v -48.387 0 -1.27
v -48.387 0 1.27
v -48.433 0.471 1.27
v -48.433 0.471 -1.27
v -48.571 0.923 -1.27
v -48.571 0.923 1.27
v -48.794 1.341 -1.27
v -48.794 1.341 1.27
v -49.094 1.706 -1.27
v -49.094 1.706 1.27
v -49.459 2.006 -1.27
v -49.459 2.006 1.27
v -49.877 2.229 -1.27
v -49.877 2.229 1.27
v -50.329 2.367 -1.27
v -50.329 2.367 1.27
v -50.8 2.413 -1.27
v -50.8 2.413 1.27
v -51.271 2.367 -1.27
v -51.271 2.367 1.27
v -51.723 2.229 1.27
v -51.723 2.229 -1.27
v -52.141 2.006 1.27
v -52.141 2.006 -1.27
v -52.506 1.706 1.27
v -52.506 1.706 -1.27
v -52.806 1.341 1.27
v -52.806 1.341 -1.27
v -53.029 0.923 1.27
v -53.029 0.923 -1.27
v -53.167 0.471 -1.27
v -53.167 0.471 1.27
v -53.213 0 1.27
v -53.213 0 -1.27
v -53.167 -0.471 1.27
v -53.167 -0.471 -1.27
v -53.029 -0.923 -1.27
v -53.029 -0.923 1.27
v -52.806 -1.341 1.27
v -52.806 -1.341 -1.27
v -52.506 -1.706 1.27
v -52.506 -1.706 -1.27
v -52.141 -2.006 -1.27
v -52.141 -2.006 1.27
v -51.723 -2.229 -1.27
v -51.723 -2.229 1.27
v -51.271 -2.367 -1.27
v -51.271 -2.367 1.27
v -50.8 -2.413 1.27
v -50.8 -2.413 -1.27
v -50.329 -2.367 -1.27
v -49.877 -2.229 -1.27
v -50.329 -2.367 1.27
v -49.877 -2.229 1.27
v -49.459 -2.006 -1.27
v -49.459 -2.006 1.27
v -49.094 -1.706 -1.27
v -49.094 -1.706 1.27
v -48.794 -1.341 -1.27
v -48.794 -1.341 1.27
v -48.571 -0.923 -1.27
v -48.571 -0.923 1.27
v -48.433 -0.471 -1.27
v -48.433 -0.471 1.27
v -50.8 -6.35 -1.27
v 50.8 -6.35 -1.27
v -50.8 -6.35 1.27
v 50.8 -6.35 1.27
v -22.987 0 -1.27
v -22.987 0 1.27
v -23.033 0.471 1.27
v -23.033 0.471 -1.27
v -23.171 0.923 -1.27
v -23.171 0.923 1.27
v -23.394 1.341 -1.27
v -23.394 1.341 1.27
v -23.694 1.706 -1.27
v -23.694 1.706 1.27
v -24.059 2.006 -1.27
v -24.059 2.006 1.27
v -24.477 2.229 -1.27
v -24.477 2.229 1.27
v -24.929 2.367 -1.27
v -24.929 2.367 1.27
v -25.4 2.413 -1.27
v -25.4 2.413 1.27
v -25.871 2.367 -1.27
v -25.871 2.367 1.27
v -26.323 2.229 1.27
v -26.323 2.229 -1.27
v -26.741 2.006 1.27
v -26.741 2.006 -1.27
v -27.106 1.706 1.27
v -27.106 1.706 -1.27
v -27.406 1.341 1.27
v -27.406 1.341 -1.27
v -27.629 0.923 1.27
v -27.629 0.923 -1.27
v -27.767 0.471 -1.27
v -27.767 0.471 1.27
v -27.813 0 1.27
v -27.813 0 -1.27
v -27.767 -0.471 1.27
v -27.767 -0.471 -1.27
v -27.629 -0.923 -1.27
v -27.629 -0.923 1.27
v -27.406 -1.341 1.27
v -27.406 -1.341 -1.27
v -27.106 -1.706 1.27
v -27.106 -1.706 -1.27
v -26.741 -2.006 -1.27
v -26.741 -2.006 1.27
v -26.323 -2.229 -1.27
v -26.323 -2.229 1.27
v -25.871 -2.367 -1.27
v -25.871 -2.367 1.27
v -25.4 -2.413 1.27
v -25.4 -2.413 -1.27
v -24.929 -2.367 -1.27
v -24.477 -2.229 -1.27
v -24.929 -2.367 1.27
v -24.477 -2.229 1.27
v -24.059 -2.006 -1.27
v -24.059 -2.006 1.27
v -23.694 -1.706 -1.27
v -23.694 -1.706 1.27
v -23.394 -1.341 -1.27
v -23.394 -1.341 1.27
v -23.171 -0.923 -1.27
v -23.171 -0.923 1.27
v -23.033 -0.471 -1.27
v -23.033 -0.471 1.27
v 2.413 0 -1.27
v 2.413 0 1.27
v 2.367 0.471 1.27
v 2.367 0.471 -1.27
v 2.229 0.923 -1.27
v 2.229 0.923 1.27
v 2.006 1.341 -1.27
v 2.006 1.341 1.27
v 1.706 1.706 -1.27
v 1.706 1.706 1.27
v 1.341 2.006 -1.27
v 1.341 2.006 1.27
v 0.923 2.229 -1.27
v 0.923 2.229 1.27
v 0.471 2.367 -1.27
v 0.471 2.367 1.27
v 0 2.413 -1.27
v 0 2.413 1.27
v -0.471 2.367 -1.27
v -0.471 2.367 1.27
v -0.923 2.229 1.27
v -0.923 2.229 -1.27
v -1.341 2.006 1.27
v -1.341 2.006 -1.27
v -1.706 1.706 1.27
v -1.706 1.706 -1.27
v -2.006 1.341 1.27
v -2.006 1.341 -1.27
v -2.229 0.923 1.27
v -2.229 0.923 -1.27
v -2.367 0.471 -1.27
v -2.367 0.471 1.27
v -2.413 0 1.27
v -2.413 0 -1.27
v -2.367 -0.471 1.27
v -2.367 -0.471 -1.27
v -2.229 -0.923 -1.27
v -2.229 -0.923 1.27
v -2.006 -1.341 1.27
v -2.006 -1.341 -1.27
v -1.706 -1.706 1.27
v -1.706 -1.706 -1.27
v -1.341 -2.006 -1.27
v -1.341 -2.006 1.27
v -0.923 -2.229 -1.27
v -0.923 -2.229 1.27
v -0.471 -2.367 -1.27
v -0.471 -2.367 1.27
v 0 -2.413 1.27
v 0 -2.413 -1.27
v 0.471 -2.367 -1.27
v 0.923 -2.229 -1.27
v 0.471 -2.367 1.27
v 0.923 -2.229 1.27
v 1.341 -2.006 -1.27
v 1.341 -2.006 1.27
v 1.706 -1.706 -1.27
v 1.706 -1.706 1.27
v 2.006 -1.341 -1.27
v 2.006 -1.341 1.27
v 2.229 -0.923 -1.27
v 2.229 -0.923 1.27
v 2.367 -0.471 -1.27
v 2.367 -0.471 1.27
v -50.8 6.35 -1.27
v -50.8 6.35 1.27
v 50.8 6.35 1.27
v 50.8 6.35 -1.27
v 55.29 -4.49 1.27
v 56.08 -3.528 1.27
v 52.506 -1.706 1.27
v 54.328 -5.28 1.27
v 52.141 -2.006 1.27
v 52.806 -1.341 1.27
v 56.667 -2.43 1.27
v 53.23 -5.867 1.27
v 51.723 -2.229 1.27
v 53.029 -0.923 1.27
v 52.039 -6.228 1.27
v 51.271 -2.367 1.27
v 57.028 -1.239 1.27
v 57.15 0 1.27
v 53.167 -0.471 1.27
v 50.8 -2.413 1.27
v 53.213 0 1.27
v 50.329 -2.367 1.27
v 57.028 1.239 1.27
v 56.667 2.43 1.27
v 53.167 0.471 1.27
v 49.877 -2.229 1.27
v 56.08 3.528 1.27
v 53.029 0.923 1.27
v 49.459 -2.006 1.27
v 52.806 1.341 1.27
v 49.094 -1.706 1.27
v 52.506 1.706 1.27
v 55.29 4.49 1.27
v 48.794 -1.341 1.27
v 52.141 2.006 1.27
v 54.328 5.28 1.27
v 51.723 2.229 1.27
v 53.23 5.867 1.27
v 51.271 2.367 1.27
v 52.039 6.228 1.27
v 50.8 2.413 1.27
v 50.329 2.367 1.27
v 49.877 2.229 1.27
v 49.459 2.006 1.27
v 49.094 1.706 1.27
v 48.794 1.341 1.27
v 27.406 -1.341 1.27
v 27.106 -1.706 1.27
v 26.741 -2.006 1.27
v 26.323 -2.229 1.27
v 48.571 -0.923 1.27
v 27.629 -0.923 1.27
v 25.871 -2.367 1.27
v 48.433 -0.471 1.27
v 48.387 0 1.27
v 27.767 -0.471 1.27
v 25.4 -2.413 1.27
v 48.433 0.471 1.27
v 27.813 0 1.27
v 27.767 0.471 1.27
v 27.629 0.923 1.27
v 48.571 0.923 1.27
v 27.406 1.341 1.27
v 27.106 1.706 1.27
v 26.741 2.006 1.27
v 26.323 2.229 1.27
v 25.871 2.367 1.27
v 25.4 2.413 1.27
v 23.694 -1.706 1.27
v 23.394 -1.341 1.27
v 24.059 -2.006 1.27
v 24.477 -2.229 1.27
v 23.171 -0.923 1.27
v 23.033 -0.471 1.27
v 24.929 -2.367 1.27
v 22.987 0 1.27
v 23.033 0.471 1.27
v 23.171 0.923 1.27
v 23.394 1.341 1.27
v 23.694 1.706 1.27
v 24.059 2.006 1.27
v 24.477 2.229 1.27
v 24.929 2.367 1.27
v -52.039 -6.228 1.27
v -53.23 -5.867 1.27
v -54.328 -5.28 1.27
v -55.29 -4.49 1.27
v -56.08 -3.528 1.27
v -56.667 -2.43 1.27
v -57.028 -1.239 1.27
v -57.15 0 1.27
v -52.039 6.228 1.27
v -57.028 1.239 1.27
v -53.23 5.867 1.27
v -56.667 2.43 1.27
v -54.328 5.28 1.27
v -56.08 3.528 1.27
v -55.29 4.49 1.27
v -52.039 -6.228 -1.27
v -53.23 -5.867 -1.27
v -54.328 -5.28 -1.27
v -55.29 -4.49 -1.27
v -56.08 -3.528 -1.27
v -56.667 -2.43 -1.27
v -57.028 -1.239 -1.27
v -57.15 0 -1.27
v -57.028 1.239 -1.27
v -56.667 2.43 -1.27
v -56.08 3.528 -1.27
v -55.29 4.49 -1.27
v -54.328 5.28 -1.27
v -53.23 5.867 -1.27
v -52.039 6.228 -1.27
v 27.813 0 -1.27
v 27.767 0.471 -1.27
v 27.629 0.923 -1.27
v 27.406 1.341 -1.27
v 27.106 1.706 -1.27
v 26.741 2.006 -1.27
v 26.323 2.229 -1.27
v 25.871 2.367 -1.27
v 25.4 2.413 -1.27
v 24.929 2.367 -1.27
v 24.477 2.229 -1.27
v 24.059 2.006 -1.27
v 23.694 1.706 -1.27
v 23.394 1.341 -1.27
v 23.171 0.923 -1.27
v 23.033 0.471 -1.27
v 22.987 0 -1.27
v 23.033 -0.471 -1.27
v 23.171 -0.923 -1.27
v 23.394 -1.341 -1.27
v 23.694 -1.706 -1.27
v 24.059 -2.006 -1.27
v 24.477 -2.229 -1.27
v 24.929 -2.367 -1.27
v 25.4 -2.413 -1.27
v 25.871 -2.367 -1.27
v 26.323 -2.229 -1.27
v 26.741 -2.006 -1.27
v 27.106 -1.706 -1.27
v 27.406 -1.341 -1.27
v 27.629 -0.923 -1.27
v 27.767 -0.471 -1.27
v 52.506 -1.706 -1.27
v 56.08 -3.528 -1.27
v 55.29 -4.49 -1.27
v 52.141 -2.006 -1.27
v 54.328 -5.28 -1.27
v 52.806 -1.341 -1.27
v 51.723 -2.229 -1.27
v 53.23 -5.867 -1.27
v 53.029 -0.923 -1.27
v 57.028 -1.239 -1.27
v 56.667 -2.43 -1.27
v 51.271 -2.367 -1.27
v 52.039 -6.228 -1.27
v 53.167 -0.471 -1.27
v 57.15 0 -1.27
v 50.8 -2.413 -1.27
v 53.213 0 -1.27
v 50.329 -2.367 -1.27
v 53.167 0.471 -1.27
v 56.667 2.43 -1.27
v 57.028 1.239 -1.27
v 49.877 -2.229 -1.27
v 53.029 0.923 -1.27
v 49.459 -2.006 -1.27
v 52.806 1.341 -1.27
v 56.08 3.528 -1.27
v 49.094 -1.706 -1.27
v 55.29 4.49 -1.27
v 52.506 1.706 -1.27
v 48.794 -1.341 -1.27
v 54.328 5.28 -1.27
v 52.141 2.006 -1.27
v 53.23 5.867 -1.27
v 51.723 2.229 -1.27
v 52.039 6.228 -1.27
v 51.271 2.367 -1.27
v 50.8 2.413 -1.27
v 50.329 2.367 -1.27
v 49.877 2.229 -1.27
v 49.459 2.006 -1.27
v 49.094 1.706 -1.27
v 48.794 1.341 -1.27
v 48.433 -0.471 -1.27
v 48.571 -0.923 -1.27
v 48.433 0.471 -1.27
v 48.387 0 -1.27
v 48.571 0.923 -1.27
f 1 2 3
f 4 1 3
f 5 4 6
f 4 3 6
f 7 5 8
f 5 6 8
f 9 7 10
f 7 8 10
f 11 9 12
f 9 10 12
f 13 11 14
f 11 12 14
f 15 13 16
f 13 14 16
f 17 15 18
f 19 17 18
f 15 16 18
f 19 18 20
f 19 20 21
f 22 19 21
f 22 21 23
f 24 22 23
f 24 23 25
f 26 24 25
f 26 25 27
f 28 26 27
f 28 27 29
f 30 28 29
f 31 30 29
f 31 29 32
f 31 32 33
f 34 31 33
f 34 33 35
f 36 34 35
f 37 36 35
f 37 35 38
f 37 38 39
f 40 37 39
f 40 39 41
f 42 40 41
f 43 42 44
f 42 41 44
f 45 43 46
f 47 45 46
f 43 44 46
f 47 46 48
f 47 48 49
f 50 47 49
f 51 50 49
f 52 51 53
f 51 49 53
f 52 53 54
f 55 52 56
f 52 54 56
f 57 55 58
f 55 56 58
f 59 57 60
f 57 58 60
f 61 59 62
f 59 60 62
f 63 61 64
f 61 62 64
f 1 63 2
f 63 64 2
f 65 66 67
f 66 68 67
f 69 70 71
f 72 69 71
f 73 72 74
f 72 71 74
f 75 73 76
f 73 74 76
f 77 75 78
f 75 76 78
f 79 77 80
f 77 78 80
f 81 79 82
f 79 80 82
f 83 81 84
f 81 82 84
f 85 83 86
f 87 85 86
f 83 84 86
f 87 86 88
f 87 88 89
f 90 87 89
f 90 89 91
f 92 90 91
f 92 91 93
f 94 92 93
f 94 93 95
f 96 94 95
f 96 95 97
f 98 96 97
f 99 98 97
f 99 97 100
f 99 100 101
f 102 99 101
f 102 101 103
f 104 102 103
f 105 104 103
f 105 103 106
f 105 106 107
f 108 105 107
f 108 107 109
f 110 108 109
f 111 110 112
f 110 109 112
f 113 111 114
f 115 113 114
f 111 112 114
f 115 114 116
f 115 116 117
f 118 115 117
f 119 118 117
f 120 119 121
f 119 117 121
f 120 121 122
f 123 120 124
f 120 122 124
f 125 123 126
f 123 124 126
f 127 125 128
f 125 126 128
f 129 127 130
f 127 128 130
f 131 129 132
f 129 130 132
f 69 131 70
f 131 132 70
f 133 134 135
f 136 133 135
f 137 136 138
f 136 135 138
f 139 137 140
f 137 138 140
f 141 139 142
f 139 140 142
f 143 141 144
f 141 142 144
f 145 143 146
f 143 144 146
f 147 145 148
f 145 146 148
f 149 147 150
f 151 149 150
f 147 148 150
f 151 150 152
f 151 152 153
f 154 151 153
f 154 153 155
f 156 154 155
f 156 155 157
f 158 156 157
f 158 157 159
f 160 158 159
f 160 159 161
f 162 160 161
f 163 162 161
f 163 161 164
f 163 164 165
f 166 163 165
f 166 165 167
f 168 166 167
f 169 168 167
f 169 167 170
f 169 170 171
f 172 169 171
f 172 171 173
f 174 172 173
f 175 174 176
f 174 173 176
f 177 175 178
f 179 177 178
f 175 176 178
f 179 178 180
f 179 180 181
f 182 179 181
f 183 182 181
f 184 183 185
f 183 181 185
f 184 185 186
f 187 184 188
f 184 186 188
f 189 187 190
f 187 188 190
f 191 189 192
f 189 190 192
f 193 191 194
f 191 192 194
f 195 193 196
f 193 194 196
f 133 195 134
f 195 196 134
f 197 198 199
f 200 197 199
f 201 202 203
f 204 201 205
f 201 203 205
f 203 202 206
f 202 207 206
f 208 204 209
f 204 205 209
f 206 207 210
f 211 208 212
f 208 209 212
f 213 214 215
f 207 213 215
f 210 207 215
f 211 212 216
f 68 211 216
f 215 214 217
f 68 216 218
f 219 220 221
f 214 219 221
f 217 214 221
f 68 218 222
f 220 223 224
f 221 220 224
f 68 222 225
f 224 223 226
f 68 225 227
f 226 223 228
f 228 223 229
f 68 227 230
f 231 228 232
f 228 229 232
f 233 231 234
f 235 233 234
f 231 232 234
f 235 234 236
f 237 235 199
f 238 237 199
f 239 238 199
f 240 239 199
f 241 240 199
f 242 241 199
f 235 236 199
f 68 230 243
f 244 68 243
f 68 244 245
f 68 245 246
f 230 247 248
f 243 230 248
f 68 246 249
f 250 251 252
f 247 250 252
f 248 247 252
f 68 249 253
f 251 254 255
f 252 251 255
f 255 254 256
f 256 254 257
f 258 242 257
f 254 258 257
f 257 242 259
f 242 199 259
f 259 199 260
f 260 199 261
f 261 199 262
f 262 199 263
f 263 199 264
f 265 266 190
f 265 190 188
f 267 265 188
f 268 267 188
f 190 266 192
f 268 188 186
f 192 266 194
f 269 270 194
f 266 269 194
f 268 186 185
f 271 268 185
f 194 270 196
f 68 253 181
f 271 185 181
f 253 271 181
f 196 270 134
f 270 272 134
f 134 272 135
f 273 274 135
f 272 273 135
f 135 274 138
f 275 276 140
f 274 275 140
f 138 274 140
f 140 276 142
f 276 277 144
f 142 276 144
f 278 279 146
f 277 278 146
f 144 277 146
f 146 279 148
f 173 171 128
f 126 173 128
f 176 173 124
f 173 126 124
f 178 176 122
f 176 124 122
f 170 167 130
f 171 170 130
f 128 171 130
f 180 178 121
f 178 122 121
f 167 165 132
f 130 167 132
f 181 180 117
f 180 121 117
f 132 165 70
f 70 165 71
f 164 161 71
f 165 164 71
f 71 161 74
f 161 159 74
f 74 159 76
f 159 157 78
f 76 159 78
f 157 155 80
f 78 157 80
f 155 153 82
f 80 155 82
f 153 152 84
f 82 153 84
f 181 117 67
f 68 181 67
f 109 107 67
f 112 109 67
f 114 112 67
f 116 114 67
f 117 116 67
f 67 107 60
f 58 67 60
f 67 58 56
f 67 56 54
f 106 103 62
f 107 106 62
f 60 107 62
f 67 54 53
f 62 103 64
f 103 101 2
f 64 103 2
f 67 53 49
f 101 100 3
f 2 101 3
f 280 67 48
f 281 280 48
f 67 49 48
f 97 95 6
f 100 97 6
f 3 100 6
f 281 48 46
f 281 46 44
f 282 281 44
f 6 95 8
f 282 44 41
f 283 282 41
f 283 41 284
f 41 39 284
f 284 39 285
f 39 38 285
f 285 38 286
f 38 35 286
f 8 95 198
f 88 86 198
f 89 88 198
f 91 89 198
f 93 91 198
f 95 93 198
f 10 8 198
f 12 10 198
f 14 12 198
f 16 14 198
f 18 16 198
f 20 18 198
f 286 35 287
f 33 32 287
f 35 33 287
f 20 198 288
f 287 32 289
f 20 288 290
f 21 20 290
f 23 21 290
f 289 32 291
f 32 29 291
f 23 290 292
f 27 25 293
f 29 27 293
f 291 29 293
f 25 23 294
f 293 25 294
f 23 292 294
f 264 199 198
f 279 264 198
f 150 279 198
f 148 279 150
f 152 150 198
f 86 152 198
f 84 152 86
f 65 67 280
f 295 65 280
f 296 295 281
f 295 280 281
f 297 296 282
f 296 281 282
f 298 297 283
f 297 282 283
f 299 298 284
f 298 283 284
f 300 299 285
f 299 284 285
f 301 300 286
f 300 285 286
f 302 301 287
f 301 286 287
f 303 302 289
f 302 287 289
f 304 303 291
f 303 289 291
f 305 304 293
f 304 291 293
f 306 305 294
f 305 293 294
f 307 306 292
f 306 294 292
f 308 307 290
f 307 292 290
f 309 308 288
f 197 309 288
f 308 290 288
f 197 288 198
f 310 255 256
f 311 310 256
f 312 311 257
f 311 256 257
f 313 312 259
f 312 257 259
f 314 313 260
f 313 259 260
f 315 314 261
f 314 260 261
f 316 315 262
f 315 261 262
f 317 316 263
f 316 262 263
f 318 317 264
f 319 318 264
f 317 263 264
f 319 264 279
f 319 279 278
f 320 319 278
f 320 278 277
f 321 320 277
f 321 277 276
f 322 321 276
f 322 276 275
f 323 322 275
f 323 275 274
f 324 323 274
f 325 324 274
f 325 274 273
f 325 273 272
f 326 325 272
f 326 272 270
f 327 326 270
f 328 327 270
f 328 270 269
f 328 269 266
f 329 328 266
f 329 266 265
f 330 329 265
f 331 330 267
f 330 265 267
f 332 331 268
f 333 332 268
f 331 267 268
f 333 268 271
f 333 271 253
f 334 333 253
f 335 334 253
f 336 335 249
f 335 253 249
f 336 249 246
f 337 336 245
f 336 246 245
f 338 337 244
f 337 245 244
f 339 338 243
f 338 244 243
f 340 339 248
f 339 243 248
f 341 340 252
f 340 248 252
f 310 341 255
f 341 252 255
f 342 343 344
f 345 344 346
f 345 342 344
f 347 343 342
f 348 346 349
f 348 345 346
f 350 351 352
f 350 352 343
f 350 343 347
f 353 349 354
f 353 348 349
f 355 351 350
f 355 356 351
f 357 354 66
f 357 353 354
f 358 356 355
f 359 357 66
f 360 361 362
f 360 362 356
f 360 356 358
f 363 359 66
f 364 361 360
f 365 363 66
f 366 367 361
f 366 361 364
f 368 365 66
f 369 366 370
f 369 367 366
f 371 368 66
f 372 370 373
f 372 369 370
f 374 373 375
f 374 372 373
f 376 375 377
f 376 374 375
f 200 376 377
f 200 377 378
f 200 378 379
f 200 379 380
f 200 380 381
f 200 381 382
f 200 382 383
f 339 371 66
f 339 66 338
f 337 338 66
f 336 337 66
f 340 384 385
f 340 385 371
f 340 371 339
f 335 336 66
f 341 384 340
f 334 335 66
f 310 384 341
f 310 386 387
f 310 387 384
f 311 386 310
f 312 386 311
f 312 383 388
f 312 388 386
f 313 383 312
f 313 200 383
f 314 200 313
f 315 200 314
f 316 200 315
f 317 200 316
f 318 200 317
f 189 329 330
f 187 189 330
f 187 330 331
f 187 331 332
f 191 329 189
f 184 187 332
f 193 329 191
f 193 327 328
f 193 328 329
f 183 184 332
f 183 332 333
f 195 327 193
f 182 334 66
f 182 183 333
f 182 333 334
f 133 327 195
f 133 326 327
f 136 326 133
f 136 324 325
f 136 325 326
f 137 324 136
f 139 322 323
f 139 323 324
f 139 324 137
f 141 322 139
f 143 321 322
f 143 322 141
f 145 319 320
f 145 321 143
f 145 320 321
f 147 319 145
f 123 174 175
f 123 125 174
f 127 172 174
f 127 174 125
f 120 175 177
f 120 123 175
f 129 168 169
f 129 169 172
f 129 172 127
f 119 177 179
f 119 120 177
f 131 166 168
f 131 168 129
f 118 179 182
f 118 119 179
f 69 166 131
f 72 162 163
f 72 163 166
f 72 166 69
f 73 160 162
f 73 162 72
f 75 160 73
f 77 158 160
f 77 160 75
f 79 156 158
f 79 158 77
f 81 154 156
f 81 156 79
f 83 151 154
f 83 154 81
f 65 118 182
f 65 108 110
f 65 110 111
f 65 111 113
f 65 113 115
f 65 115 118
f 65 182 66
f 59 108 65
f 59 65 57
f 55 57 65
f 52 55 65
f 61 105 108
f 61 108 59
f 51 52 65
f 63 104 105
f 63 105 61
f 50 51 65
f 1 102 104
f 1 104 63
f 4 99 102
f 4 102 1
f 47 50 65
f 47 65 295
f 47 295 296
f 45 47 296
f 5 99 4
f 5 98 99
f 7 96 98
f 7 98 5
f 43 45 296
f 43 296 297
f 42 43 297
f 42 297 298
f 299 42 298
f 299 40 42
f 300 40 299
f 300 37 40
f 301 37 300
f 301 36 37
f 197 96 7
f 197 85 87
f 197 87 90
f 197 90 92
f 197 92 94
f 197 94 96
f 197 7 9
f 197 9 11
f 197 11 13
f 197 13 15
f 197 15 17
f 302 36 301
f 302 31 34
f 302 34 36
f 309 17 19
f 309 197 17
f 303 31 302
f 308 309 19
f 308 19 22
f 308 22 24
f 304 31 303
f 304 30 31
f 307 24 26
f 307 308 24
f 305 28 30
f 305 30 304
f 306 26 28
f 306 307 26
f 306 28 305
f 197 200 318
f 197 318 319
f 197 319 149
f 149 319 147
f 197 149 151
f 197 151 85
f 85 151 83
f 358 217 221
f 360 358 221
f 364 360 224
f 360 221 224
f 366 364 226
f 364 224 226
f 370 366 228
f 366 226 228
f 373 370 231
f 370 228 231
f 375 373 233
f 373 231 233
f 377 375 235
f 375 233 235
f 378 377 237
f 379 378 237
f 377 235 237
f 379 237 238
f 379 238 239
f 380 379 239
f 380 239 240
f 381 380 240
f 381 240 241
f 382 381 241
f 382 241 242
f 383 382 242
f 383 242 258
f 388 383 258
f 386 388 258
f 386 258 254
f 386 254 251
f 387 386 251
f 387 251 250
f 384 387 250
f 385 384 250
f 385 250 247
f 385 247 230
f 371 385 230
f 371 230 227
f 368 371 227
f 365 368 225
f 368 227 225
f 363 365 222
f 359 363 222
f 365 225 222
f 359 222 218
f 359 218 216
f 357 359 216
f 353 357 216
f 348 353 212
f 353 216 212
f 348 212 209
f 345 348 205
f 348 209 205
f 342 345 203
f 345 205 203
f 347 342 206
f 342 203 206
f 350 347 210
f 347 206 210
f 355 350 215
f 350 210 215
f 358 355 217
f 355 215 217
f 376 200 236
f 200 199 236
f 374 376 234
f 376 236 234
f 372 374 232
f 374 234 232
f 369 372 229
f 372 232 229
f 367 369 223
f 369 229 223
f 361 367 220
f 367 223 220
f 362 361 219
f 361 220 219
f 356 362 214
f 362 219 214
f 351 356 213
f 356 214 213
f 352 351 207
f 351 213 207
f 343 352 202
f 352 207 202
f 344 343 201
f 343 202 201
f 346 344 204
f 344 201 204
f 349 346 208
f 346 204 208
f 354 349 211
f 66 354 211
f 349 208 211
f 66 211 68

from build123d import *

# Parameters (mm, degrees)
BOSS_EXTRUDE1_DEPTH = 1.27
SKETCH2_R           = 2.413
CUT_EXTRUDE1_DEPTH  = 58.557767504
LPATTERN1_COUNT     = 5
LPATTERN1_PITCH     = 25.4


with BuildPart() as part:
    # Sketch1 → Boss-Extrude1 (new, symmetric)
    with BuildSketch(Plane.XY):
        with BuildLine():
            Line((-50.8, 6.35), (50.8, 6.35))
            ThreePointArc((50.8, 6.35), (57.15, 0), (50.8, -6.35))
            Line((50.8, -6.35), (-50.8, -6.35))
            ThreePointArc((-50.8, -6.35), (-57.15, 0), (-50.8, 6.35))
        make_face()
    extrude(amount=BOSS_EXTRUDE1_DEPTH, both=True)

    # Sketch2 → Cut-Extrude1 (cut, through all)
    with BuildSketch(Plane.XY.offset(1.27)):
        with Locations((-50.8, 0)):
            Circle(SKETCH2_R)
    cut_extrude1 = extrude(amount=-CUT_EXTRUDE1_DEPTH, mode=Mode.SUBTRACT)

    # LPattern1: Cut-Extrude1 ×5
    with Locations(*[(i * LPATTERN1_PITCH, 0, 0) for i in range(1, LPATTERN1_COUNT)]):
        add(cut_extrude1, mode=Mode.SUBTRACT)


solid = part.part
